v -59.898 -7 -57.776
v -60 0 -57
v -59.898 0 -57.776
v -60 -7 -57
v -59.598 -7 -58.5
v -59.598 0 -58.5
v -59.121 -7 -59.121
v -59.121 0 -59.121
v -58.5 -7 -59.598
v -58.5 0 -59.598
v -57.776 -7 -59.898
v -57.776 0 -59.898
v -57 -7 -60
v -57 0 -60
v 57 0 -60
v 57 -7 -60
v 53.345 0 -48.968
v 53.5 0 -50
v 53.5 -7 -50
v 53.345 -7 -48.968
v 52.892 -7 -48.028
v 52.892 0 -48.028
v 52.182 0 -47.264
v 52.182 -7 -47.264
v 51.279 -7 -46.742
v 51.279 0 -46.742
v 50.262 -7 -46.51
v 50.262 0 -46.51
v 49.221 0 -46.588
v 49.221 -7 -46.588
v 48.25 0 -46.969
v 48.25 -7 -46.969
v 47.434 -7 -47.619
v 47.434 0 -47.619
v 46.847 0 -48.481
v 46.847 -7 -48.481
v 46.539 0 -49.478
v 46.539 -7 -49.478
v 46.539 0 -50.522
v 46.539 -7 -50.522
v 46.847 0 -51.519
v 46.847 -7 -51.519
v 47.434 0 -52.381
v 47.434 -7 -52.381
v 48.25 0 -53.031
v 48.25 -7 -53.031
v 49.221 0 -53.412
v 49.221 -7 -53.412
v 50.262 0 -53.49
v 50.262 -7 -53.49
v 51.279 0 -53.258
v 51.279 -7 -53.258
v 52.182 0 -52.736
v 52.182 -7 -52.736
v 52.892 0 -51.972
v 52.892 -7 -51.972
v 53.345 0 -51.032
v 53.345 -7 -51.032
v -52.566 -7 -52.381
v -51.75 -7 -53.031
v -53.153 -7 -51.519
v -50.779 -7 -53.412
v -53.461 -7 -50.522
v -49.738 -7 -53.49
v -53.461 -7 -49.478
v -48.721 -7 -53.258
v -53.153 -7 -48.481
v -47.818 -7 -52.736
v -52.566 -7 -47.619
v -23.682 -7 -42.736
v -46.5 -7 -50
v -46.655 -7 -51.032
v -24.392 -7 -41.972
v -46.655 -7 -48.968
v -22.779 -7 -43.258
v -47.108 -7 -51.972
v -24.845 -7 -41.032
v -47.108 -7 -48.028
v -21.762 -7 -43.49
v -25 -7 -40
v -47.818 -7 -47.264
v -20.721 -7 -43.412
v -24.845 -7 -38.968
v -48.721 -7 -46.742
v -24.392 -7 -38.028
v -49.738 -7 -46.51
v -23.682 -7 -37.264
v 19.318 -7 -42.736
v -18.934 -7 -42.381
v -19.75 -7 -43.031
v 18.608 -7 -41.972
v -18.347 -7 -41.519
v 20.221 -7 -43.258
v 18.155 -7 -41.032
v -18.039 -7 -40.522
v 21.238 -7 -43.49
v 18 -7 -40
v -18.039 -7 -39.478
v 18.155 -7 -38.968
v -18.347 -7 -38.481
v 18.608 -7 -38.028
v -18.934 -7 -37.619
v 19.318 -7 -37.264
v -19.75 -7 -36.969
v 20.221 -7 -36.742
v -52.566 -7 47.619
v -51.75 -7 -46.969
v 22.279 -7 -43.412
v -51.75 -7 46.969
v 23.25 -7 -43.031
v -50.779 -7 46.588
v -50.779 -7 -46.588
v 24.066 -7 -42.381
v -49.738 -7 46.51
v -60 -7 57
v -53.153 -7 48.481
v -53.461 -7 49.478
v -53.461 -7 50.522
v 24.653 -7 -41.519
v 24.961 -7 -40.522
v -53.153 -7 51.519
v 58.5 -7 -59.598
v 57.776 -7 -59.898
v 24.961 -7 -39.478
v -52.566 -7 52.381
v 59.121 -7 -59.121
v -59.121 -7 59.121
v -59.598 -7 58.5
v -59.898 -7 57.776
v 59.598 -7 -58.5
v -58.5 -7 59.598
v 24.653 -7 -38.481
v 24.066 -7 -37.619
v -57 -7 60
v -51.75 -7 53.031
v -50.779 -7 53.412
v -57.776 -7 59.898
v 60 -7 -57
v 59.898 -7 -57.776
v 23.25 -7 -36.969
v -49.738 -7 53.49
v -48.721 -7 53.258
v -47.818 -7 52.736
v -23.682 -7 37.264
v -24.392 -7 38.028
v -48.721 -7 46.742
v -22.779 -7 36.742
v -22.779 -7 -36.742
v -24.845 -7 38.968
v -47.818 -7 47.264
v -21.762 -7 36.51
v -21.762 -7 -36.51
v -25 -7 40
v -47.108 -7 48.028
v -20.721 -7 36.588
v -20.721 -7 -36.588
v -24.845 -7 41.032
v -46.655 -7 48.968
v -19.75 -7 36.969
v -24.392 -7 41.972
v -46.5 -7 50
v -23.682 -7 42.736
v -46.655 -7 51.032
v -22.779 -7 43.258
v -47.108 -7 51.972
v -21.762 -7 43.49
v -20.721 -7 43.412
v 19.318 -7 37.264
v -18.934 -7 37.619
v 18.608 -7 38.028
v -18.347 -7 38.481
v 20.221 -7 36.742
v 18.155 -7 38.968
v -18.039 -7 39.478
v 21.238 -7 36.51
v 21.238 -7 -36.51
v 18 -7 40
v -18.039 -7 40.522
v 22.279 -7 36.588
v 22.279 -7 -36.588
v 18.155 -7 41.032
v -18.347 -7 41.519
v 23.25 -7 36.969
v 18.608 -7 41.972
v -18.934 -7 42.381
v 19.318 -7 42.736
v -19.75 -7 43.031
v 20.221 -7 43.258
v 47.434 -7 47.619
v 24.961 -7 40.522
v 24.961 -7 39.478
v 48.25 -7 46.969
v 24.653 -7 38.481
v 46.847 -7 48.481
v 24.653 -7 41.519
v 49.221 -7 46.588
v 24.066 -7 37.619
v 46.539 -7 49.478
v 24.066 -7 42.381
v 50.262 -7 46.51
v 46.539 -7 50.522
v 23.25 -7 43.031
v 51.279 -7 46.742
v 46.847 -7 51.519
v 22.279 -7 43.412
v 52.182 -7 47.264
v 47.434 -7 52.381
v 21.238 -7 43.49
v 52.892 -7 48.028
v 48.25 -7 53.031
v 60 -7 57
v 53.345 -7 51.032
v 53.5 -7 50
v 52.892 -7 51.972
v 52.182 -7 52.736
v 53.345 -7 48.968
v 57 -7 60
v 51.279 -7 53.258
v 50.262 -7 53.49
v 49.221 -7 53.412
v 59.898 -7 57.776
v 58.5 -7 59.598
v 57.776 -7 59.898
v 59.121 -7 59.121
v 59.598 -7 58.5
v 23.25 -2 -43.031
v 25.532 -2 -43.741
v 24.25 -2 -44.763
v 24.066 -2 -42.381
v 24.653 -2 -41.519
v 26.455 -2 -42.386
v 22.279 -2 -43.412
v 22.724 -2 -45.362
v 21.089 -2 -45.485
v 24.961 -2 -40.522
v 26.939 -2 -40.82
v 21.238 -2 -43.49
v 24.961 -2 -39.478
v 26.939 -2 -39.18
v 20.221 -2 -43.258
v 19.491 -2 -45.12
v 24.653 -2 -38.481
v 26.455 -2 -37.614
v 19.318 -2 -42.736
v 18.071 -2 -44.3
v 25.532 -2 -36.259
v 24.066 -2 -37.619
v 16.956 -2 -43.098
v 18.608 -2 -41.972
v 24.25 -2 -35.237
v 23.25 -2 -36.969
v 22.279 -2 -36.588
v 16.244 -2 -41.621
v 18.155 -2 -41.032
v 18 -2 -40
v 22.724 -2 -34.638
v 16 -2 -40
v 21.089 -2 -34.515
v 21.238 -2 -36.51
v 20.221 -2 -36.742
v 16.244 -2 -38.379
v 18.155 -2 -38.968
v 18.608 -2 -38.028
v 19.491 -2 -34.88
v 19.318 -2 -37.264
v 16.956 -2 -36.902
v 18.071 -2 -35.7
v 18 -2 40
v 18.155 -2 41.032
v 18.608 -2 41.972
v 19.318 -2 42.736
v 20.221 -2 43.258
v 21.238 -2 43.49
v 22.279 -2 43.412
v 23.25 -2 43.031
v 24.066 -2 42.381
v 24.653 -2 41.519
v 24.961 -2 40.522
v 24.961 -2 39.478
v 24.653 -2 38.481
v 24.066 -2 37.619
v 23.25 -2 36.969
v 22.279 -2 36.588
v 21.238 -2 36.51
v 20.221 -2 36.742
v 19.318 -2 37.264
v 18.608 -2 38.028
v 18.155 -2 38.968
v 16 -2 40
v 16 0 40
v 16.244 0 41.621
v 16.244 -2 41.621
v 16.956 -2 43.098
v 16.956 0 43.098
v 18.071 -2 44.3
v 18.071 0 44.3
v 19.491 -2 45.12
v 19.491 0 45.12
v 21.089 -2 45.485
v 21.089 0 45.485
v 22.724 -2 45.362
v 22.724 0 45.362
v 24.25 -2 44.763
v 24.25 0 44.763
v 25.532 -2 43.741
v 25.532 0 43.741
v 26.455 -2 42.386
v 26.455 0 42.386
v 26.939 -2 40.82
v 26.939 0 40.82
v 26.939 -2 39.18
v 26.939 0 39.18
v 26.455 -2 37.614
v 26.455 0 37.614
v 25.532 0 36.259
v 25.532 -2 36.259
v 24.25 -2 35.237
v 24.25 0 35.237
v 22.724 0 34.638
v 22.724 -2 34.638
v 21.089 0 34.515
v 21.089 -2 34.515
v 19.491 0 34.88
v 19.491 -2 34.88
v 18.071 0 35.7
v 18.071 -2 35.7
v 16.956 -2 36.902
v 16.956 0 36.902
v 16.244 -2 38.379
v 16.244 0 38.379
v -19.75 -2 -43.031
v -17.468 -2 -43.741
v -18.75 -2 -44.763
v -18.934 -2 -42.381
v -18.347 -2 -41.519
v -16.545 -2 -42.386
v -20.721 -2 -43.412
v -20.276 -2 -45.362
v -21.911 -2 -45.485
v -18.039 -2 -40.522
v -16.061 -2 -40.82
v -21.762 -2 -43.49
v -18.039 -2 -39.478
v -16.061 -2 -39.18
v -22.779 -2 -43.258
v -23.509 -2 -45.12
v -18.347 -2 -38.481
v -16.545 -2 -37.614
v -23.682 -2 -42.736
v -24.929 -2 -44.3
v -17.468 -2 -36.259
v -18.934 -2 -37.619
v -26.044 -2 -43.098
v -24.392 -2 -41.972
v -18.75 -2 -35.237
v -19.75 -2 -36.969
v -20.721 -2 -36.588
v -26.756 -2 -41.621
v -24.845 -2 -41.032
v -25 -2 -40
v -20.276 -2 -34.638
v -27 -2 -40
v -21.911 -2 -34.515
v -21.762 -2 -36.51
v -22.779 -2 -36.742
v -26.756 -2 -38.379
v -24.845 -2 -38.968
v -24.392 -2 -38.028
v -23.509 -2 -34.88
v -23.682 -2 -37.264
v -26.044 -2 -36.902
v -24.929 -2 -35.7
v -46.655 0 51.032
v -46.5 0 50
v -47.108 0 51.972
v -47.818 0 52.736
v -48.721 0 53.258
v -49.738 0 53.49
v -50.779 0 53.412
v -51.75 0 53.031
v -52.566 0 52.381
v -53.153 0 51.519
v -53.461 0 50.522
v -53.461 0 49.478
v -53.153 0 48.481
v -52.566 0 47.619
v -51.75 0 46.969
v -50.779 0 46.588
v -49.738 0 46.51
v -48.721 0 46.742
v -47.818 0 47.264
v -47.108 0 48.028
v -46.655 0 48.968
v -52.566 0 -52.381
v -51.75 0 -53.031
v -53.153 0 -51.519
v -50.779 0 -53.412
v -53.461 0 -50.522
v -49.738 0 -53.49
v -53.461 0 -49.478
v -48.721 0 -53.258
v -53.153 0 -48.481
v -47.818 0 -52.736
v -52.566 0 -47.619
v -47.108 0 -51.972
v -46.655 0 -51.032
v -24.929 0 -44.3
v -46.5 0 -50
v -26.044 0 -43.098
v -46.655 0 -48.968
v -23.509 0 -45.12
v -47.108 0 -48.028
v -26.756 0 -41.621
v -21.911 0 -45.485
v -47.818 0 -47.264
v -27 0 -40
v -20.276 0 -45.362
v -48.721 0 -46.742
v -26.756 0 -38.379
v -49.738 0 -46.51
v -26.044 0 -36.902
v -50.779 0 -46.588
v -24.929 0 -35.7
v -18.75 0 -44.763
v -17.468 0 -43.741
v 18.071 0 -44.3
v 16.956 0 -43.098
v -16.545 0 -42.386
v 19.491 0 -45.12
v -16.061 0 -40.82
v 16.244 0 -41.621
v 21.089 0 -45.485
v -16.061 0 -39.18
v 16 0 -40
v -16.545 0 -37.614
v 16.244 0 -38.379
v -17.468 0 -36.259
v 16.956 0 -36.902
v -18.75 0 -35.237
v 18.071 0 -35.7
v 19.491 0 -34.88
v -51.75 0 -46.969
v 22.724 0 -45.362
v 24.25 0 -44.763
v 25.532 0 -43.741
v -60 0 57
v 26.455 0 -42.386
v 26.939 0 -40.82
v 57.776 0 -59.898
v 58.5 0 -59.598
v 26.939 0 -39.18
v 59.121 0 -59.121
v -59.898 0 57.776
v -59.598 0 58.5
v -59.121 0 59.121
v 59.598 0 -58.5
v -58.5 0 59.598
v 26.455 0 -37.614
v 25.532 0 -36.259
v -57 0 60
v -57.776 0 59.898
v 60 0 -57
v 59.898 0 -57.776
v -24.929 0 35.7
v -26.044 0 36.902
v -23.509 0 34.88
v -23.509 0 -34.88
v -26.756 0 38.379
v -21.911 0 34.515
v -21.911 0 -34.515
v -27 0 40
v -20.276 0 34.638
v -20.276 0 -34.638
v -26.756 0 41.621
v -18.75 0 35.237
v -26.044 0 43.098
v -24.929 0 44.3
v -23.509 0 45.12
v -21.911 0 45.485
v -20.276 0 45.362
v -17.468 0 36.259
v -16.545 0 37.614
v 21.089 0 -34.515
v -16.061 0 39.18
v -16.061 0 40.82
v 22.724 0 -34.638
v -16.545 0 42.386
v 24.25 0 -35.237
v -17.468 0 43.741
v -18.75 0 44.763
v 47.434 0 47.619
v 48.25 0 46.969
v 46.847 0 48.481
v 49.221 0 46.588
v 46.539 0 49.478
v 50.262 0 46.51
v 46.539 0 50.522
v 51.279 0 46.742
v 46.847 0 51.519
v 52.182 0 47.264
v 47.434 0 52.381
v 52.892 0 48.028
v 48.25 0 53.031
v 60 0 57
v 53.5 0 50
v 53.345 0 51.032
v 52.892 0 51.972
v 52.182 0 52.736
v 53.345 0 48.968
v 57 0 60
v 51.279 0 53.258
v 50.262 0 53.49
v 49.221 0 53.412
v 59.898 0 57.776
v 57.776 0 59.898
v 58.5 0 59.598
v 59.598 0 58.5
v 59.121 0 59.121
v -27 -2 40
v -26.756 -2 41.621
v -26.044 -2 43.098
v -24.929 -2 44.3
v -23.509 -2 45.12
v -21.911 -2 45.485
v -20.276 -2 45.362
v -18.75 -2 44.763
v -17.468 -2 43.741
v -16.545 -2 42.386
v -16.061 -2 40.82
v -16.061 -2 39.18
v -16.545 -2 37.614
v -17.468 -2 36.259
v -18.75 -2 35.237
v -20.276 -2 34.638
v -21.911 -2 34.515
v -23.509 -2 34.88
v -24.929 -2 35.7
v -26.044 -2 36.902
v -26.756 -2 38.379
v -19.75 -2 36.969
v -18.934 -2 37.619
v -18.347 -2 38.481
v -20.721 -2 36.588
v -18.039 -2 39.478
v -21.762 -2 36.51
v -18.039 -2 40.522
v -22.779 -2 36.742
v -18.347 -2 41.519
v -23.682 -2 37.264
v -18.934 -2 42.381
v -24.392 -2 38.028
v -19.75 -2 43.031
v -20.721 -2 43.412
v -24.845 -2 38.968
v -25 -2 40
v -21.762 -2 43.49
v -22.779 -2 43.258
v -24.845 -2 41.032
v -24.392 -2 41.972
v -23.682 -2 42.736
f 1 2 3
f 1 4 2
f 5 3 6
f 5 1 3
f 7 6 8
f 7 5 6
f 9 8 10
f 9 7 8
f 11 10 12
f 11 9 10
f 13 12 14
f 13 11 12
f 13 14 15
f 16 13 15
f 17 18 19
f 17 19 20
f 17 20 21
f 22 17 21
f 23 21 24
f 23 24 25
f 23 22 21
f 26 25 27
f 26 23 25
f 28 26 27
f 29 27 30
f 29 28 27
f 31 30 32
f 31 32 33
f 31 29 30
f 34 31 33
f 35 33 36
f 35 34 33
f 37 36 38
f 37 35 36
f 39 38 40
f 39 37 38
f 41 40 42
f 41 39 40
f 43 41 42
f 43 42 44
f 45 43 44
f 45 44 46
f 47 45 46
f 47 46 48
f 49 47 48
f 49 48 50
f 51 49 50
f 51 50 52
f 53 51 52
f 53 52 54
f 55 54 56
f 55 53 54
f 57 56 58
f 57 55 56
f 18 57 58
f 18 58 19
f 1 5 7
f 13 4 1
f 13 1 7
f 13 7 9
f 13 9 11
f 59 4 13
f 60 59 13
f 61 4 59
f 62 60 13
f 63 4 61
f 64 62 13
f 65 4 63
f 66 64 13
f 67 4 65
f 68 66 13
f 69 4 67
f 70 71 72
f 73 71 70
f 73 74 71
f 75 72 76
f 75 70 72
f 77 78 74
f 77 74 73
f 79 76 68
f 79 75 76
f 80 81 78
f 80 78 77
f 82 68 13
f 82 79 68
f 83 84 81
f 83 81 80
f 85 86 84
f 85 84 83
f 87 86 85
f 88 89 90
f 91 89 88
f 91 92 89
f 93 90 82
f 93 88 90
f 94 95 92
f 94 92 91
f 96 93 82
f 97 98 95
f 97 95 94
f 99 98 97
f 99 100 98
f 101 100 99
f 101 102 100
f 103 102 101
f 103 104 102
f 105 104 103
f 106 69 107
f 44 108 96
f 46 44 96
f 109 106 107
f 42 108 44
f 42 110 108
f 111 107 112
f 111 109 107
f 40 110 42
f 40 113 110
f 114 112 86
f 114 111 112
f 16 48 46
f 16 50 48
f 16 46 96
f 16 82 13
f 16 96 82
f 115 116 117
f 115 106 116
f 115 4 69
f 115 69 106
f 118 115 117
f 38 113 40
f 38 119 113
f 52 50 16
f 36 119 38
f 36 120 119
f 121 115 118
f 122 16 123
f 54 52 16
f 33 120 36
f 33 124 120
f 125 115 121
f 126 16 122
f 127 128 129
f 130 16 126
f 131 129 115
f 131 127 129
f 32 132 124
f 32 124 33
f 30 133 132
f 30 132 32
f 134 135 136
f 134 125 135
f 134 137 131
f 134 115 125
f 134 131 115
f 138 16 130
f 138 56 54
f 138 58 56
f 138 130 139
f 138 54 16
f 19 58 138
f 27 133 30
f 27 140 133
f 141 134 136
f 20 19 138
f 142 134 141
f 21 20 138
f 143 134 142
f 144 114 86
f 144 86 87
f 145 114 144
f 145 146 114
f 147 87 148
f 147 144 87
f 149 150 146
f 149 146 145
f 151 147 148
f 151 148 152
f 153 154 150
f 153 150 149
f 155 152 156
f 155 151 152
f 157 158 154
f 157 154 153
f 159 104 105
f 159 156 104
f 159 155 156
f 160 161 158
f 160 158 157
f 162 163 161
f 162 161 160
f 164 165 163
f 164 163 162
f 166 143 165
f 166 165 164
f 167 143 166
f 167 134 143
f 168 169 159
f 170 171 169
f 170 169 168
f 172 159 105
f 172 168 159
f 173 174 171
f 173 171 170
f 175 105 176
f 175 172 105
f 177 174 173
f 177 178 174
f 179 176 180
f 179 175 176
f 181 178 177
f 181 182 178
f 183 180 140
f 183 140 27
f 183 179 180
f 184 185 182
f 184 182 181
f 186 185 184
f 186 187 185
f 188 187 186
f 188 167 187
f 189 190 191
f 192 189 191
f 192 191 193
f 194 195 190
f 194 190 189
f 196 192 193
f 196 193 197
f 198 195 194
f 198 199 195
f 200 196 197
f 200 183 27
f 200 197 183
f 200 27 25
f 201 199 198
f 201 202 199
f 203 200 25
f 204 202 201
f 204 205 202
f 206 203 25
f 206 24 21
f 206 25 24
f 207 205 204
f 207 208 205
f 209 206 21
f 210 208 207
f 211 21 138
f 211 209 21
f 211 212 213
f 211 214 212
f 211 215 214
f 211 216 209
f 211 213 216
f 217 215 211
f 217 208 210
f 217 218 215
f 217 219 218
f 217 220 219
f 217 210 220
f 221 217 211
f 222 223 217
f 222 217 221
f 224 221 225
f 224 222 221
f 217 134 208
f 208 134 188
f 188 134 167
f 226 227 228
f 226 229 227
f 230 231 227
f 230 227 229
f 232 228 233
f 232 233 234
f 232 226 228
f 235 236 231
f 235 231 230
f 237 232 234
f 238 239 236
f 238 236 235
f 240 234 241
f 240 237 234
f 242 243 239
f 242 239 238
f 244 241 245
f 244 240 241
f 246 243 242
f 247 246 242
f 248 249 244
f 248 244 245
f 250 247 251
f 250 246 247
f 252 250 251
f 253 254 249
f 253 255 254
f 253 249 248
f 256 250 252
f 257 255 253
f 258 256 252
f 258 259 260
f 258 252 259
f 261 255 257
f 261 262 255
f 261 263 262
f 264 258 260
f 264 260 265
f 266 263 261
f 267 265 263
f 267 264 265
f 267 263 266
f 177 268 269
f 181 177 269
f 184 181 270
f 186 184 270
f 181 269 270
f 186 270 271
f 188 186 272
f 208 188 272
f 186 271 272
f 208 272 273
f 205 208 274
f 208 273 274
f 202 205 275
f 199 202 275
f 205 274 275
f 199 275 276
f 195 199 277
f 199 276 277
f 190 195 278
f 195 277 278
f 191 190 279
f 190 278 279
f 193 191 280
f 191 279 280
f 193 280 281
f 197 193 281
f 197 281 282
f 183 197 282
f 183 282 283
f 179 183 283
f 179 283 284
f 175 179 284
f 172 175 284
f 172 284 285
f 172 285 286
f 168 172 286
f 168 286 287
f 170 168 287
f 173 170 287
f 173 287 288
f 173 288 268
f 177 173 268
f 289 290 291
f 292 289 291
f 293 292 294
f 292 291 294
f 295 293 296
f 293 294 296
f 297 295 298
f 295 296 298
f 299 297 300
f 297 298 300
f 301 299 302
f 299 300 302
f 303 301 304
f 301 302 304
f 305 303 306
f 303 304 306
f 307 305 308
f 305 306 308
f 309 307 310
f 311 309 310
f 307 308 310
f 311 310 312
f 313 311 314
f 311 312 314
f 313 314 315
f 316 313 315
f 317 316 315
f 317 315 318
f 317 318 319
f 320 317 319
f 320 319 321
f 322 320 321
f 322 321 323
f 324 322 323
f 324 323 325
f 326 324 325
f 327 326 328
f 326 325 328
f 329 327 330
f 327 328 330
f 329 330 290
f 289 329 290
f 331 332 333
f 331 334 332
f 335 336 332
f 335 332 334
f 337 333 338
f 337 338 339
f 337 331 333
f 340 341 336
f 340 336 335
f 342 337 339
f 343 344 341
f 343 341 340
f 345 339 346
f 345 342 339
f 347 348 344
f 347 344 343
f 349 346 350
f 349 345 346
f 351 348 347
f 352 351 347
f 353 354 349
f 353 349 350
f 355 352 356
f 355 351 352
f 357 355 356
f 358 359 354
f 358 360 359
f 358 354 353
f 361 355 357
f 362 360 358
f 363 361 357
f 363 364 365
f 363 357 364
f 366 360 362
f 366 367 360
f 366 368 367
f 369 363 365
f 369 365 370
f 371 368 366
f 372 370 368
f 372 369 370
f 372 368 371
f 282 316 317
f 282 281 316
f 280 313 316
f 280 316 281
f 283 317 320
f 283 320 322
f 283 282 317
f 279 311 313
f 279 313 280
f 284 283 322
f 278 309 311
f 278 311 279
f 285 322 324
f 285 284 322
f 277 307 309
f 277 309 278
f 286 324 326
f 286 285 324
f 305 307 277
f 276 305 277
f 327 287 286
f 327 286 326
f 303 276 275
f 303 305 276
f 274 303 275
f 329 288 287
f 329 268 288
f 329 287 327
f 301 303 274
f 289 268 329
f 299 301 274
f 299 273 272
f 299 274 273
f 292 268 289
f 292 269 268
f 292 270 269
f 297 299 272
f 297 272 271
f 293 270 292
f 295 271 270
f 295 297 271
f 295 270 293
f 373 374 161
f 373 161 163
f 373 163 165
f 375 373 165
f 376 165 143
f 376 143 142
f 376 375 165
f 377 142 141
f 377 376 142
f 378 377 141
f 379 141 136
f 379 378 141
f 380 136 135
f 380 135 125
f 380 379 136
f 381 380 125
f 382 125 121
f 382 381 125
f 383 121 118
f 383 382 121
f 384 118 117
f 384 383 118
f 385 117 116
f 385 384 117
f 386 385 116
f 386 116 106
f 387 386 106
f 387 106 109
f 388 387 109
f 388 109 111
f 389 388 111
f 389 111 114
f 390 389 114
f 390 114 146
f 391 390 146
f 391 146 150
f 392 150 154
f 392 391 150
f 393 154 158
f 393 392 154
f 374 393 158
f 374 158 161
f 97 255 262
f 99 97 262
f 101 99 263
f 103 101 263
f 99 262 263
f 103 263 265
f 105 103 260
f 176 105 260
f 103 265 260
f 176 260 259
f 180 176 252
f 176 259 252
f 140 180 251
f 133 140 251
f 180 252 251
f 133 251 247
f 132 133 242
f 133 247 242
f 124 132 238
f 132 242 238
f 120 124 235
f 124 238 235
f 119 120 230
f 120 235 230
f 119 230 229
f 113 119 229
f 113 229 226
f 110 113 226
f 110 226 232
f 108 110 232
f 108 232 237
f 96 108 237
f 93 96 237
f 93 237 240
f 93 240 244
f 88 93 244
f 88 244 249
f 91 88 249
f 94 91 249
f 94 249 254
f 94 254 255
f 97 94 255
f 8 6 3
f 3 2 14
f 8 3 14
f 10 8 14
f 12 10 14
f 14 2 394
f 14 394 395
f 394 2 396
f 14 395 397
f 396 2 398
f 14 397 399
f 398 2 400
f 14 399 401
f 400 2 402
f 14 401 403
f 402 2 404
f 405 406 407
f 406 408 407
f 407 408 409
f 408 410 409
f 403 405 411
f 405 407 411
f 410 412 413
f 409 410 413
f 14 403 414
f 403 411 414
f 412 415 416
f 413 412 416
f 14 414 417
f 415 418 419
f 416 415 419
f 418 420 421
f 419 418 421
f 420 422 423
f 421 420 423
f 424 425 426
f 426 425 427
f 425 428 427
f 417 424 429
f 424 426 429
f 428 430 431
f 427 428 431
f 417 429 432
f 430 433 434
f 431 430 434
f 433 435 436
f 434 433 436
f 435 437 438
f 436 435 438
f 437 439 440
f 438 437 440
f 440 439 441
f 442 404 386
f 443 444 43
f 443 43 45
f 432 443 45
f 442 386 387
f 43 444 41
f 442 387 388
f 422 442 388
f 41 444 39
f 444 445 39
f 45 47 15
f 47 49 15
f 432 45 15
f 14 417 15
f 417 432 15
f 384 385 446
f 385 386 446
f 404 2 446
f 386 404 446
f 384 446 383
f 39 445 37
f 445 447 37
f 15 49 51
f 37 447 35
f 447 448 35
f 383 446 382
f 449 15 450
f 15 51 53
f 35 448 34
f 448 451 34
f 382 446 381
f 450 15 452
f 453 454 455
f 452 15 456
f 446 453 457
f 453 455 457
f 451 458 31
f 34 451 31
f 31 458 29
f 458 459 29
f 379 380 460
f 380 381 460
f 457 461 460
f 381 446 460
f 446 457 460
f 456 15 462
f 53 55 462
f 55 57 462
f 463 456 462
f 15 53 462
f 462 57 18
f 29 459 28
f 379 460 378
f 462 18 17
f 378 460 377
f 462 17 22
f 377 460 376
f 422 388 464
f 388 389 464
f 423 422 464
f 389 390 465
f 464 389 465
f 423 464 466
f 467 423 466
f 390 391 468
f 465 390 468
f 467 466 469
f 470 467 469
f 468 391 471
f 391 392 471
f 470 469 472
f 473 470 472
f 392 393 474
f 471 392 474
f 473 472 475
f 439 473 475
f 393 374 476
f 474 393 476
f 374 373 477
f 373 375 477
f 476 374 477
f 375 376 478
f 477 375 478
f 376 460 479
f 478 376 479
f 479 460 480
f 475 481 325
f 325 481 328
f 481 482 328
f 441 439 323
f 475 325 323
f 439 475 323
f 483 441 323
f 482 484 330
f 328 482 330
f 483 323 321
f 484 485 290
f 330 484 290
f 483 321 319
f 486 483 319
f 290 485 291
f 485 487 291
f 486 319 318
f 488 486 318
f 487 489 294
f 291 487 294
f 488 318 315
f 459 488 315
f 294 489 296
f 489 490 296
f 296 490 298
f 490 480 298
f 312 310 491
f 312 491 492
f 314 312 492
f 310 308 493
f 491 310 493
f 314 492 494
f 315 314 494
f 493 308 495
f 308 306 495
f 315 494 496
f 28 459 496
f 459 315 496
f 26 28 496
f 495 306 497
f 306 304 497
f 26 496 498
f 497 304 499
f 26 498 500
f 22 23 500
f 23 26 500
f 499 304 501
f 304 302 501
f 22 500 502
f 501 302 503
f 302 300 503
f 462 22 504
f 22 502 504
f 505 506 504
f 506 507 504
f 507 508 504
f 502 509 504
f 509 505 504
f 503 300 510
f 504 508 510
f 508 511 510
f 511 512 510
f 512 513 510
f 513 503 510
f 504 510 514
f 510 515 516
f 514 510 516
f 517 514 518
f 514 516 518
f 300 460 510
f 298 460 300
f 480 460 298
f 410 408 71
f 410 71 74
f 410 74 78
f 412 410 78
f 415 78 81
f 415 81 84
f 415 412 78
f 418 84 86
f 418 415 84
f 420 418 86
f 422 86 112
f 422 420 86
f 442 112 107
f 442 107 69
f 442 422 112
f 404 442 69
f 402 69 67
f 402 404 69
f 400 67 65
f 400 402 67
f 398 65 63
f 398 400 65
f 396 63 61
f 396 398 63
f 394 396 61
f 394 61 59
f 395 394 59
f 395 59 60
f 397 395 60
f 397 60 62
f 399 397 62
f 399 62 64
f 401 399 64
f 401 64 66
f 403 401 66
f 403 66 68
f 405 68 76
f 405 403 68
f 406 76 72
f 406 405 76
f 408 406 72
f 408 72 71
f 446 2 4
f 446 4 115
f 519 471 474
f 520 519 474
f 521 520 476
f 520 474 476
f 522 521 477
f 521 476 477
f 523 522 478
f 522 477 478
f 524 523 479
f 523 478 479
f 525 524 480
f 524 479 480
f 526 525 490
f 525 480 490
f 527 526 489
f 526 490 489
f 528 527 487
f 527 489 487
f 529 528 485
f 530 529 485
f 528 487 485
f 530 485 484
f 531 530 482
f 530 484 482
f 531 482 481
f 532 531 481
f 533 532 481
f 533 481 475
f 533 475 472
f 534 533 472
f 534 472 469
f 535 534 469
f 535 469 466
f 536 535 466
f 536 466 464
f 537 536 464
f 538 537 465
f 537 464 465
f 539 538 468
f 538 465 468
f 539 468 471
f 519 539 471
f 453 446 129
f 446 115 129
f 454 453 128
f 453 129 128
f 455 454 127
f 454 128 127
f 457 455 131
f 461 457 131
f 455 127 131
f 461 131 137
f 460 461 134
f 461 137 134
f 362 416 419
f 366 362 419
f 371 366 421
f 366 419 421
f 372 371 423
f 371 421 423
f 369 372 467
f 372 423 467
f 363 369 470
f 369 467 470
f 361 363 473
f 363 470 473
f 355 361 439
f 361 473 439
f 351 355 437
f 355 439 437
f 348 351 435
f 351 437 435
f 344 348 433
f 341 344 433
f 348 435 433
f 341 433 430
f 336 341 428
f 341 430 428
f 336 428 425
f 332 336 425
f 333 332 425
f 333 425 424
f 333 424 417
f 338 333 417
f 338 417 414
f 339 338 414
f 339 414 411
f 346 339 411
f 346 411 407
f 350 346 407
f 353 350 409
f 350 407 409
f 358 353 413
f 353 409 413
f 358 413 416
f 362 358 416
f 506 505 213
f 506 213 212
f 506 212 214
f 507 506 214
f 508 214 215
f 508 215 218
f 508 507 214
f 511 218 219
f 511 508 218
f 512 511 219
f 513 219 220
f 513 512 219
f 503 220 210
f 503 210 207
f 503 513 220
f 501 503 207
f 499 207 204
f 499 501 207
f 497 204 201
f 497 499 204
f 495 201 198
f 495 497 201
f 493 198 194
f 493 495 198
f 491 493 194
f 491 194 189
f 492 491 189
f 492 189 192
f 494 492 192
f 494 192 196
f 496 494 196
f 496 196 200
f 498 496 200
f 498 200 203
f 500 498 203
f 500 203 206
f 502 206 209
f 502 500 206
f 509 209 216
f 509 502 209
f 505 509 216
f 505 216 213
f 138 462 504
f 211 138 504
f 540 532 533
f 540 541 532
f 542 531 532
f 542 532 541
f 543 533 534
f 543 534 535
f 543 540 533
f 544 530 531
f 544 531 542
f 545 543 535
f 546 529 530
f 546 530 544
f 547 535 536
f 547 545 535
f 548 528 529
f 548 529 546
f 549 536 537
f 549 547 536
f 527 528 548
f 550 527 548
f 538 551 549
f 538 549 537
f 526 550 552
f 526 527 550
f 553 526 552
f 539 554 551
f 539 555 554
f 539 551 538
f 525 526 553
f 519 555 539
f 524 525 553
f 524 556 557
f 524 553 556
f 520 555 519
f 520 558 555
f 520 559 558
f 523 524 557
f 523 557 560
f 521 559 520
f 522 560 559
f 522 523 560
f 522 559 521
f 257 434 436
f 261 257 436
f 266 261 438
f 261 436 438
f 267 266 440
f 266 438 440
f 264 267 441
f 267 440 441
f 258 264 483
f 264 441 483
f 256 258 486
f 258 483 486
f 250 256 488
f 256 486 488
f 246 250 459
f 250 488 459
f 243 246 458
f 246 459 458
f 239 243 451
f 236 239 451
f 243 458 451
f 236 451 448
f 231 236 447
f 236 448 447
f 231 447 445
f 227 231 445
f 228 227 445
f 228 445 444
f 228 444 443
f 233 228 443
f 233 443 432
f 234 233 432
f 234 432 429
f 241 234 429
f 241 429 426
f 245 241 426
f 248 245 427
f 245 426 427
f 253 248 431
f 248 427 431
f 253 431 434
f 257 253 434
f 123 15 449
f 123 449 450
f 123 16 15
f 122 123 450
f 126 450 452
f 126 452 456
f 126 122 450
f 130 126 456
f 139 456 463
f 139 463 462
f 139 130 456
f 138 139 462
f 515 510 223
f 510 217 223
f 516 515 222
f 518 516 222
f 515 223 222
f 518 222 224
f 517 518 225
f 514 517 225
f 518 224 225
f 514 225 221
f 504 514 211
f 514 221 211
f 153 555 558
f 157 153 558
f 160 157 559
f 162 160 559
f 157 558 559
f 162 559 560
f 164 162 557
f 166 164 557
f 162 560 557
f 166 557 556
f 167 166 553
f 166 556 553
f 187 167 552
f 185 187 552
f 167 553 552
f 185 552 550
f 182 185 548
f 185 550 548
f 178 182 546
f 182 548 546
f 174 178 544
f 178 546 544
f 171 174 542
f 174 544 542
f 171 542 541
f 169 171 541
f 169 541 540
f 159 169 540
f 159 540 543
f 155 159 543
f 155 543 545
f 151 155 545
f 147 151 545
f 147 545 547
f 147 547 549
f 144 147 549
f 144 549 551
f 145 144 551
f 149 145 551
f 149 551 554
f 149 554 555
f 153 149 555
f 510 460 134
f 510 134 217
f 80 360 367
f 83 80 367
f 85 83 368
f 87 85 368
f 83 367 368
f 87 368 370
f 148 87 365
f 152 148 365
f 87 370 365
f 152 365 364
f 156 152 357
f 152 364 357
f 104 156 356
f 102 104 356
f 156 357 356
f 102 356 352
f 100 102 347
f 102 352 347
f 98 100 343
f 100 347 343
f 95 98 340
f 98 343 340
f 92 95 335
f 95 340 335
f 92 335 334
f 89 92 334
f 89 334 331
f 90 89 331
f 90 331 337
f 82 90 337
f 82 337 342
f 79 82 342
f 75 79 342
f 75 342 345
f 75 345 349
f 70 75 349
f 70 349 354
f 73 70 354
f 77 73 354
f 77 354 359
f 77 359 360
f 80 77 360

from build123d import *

# Parameters (mm, degrees)
F0_W     = 120
F0_H     = 120
F0_R     = 3.5
F1_DEPTH = 7
F2_R     = 3
F3_R     = 3.5
F4_DEPTH = 25
F5_R     = 5.5
F6_DEPTH = 2


with BuildPart() as f1:
    # F0 (on Front) → F1 (new body)
    with BuildSketch(Plane.XZ):
        Rectangle(F0_W, F0_H)
        with Locations((-50, -50)):
            Circle(F0_R, mode=Mode.SUBTRACT)
        with Locations((50, -50)):
            Circle(F0_R, mode=Mode.SUBTRACT)
        with Locations((-50, 50)):
            Circle(F0_R, mode=Mode.SUBTRACT)
        with Locations((50, 50)):
            Circle(F0_R, mode=Mode.SUBTRACT)
    extrude(amount=F1_DEPTH)

    # F2
    f2_edges = [f1.edges().sort_by_distance(p)[0] for p in [
        (-60, -3.5, 60),
        (-60, -3.5, -60),
        (60, -3.5, -60),
        (60, -3.5, 60),
    ]]
    fillet(f2_edges, radius=F2_R)

    # F3 (on face) → F4 (cut)
    with BuildSketch(Plane(origin=(0, 0, 0), x_dir=(-1, 0, 0), z_dir=(0, 1, 0))):
        with Locations((-21.5, 40)):
            Circle(F3_R)
        with Locations((21.5, 40)):
            Circle(F3_R)
        with Locations((-21.5, -40)):
            Circle(F3_R)
        with Locations((21.5, -40)):
            Circle(F3_R)
    extrude(amount=-F4_DEPTH, mode=Mode.SUBTRACT)

    # F5 (on face) → F6 (cut)
    with BuildSketch(Plane(origin=(0, 0, 0), x_dir=(-1, 0, 0), z_dir=(0, 1, 0))):
        with Locations((-21.5, 40)):
            Circle(F5_R)
        with Locations((21.5, 40)):
            Circle(F5_R)
        with Locations((-21.5, -40)):
            Circle(F5_R)
        with Locations((21.5, -40)):
            Circle(F5_R)
    extrude(amount=-F6_DEPTH, mode=Mode.SUBTRACT)


solid = f1.part
